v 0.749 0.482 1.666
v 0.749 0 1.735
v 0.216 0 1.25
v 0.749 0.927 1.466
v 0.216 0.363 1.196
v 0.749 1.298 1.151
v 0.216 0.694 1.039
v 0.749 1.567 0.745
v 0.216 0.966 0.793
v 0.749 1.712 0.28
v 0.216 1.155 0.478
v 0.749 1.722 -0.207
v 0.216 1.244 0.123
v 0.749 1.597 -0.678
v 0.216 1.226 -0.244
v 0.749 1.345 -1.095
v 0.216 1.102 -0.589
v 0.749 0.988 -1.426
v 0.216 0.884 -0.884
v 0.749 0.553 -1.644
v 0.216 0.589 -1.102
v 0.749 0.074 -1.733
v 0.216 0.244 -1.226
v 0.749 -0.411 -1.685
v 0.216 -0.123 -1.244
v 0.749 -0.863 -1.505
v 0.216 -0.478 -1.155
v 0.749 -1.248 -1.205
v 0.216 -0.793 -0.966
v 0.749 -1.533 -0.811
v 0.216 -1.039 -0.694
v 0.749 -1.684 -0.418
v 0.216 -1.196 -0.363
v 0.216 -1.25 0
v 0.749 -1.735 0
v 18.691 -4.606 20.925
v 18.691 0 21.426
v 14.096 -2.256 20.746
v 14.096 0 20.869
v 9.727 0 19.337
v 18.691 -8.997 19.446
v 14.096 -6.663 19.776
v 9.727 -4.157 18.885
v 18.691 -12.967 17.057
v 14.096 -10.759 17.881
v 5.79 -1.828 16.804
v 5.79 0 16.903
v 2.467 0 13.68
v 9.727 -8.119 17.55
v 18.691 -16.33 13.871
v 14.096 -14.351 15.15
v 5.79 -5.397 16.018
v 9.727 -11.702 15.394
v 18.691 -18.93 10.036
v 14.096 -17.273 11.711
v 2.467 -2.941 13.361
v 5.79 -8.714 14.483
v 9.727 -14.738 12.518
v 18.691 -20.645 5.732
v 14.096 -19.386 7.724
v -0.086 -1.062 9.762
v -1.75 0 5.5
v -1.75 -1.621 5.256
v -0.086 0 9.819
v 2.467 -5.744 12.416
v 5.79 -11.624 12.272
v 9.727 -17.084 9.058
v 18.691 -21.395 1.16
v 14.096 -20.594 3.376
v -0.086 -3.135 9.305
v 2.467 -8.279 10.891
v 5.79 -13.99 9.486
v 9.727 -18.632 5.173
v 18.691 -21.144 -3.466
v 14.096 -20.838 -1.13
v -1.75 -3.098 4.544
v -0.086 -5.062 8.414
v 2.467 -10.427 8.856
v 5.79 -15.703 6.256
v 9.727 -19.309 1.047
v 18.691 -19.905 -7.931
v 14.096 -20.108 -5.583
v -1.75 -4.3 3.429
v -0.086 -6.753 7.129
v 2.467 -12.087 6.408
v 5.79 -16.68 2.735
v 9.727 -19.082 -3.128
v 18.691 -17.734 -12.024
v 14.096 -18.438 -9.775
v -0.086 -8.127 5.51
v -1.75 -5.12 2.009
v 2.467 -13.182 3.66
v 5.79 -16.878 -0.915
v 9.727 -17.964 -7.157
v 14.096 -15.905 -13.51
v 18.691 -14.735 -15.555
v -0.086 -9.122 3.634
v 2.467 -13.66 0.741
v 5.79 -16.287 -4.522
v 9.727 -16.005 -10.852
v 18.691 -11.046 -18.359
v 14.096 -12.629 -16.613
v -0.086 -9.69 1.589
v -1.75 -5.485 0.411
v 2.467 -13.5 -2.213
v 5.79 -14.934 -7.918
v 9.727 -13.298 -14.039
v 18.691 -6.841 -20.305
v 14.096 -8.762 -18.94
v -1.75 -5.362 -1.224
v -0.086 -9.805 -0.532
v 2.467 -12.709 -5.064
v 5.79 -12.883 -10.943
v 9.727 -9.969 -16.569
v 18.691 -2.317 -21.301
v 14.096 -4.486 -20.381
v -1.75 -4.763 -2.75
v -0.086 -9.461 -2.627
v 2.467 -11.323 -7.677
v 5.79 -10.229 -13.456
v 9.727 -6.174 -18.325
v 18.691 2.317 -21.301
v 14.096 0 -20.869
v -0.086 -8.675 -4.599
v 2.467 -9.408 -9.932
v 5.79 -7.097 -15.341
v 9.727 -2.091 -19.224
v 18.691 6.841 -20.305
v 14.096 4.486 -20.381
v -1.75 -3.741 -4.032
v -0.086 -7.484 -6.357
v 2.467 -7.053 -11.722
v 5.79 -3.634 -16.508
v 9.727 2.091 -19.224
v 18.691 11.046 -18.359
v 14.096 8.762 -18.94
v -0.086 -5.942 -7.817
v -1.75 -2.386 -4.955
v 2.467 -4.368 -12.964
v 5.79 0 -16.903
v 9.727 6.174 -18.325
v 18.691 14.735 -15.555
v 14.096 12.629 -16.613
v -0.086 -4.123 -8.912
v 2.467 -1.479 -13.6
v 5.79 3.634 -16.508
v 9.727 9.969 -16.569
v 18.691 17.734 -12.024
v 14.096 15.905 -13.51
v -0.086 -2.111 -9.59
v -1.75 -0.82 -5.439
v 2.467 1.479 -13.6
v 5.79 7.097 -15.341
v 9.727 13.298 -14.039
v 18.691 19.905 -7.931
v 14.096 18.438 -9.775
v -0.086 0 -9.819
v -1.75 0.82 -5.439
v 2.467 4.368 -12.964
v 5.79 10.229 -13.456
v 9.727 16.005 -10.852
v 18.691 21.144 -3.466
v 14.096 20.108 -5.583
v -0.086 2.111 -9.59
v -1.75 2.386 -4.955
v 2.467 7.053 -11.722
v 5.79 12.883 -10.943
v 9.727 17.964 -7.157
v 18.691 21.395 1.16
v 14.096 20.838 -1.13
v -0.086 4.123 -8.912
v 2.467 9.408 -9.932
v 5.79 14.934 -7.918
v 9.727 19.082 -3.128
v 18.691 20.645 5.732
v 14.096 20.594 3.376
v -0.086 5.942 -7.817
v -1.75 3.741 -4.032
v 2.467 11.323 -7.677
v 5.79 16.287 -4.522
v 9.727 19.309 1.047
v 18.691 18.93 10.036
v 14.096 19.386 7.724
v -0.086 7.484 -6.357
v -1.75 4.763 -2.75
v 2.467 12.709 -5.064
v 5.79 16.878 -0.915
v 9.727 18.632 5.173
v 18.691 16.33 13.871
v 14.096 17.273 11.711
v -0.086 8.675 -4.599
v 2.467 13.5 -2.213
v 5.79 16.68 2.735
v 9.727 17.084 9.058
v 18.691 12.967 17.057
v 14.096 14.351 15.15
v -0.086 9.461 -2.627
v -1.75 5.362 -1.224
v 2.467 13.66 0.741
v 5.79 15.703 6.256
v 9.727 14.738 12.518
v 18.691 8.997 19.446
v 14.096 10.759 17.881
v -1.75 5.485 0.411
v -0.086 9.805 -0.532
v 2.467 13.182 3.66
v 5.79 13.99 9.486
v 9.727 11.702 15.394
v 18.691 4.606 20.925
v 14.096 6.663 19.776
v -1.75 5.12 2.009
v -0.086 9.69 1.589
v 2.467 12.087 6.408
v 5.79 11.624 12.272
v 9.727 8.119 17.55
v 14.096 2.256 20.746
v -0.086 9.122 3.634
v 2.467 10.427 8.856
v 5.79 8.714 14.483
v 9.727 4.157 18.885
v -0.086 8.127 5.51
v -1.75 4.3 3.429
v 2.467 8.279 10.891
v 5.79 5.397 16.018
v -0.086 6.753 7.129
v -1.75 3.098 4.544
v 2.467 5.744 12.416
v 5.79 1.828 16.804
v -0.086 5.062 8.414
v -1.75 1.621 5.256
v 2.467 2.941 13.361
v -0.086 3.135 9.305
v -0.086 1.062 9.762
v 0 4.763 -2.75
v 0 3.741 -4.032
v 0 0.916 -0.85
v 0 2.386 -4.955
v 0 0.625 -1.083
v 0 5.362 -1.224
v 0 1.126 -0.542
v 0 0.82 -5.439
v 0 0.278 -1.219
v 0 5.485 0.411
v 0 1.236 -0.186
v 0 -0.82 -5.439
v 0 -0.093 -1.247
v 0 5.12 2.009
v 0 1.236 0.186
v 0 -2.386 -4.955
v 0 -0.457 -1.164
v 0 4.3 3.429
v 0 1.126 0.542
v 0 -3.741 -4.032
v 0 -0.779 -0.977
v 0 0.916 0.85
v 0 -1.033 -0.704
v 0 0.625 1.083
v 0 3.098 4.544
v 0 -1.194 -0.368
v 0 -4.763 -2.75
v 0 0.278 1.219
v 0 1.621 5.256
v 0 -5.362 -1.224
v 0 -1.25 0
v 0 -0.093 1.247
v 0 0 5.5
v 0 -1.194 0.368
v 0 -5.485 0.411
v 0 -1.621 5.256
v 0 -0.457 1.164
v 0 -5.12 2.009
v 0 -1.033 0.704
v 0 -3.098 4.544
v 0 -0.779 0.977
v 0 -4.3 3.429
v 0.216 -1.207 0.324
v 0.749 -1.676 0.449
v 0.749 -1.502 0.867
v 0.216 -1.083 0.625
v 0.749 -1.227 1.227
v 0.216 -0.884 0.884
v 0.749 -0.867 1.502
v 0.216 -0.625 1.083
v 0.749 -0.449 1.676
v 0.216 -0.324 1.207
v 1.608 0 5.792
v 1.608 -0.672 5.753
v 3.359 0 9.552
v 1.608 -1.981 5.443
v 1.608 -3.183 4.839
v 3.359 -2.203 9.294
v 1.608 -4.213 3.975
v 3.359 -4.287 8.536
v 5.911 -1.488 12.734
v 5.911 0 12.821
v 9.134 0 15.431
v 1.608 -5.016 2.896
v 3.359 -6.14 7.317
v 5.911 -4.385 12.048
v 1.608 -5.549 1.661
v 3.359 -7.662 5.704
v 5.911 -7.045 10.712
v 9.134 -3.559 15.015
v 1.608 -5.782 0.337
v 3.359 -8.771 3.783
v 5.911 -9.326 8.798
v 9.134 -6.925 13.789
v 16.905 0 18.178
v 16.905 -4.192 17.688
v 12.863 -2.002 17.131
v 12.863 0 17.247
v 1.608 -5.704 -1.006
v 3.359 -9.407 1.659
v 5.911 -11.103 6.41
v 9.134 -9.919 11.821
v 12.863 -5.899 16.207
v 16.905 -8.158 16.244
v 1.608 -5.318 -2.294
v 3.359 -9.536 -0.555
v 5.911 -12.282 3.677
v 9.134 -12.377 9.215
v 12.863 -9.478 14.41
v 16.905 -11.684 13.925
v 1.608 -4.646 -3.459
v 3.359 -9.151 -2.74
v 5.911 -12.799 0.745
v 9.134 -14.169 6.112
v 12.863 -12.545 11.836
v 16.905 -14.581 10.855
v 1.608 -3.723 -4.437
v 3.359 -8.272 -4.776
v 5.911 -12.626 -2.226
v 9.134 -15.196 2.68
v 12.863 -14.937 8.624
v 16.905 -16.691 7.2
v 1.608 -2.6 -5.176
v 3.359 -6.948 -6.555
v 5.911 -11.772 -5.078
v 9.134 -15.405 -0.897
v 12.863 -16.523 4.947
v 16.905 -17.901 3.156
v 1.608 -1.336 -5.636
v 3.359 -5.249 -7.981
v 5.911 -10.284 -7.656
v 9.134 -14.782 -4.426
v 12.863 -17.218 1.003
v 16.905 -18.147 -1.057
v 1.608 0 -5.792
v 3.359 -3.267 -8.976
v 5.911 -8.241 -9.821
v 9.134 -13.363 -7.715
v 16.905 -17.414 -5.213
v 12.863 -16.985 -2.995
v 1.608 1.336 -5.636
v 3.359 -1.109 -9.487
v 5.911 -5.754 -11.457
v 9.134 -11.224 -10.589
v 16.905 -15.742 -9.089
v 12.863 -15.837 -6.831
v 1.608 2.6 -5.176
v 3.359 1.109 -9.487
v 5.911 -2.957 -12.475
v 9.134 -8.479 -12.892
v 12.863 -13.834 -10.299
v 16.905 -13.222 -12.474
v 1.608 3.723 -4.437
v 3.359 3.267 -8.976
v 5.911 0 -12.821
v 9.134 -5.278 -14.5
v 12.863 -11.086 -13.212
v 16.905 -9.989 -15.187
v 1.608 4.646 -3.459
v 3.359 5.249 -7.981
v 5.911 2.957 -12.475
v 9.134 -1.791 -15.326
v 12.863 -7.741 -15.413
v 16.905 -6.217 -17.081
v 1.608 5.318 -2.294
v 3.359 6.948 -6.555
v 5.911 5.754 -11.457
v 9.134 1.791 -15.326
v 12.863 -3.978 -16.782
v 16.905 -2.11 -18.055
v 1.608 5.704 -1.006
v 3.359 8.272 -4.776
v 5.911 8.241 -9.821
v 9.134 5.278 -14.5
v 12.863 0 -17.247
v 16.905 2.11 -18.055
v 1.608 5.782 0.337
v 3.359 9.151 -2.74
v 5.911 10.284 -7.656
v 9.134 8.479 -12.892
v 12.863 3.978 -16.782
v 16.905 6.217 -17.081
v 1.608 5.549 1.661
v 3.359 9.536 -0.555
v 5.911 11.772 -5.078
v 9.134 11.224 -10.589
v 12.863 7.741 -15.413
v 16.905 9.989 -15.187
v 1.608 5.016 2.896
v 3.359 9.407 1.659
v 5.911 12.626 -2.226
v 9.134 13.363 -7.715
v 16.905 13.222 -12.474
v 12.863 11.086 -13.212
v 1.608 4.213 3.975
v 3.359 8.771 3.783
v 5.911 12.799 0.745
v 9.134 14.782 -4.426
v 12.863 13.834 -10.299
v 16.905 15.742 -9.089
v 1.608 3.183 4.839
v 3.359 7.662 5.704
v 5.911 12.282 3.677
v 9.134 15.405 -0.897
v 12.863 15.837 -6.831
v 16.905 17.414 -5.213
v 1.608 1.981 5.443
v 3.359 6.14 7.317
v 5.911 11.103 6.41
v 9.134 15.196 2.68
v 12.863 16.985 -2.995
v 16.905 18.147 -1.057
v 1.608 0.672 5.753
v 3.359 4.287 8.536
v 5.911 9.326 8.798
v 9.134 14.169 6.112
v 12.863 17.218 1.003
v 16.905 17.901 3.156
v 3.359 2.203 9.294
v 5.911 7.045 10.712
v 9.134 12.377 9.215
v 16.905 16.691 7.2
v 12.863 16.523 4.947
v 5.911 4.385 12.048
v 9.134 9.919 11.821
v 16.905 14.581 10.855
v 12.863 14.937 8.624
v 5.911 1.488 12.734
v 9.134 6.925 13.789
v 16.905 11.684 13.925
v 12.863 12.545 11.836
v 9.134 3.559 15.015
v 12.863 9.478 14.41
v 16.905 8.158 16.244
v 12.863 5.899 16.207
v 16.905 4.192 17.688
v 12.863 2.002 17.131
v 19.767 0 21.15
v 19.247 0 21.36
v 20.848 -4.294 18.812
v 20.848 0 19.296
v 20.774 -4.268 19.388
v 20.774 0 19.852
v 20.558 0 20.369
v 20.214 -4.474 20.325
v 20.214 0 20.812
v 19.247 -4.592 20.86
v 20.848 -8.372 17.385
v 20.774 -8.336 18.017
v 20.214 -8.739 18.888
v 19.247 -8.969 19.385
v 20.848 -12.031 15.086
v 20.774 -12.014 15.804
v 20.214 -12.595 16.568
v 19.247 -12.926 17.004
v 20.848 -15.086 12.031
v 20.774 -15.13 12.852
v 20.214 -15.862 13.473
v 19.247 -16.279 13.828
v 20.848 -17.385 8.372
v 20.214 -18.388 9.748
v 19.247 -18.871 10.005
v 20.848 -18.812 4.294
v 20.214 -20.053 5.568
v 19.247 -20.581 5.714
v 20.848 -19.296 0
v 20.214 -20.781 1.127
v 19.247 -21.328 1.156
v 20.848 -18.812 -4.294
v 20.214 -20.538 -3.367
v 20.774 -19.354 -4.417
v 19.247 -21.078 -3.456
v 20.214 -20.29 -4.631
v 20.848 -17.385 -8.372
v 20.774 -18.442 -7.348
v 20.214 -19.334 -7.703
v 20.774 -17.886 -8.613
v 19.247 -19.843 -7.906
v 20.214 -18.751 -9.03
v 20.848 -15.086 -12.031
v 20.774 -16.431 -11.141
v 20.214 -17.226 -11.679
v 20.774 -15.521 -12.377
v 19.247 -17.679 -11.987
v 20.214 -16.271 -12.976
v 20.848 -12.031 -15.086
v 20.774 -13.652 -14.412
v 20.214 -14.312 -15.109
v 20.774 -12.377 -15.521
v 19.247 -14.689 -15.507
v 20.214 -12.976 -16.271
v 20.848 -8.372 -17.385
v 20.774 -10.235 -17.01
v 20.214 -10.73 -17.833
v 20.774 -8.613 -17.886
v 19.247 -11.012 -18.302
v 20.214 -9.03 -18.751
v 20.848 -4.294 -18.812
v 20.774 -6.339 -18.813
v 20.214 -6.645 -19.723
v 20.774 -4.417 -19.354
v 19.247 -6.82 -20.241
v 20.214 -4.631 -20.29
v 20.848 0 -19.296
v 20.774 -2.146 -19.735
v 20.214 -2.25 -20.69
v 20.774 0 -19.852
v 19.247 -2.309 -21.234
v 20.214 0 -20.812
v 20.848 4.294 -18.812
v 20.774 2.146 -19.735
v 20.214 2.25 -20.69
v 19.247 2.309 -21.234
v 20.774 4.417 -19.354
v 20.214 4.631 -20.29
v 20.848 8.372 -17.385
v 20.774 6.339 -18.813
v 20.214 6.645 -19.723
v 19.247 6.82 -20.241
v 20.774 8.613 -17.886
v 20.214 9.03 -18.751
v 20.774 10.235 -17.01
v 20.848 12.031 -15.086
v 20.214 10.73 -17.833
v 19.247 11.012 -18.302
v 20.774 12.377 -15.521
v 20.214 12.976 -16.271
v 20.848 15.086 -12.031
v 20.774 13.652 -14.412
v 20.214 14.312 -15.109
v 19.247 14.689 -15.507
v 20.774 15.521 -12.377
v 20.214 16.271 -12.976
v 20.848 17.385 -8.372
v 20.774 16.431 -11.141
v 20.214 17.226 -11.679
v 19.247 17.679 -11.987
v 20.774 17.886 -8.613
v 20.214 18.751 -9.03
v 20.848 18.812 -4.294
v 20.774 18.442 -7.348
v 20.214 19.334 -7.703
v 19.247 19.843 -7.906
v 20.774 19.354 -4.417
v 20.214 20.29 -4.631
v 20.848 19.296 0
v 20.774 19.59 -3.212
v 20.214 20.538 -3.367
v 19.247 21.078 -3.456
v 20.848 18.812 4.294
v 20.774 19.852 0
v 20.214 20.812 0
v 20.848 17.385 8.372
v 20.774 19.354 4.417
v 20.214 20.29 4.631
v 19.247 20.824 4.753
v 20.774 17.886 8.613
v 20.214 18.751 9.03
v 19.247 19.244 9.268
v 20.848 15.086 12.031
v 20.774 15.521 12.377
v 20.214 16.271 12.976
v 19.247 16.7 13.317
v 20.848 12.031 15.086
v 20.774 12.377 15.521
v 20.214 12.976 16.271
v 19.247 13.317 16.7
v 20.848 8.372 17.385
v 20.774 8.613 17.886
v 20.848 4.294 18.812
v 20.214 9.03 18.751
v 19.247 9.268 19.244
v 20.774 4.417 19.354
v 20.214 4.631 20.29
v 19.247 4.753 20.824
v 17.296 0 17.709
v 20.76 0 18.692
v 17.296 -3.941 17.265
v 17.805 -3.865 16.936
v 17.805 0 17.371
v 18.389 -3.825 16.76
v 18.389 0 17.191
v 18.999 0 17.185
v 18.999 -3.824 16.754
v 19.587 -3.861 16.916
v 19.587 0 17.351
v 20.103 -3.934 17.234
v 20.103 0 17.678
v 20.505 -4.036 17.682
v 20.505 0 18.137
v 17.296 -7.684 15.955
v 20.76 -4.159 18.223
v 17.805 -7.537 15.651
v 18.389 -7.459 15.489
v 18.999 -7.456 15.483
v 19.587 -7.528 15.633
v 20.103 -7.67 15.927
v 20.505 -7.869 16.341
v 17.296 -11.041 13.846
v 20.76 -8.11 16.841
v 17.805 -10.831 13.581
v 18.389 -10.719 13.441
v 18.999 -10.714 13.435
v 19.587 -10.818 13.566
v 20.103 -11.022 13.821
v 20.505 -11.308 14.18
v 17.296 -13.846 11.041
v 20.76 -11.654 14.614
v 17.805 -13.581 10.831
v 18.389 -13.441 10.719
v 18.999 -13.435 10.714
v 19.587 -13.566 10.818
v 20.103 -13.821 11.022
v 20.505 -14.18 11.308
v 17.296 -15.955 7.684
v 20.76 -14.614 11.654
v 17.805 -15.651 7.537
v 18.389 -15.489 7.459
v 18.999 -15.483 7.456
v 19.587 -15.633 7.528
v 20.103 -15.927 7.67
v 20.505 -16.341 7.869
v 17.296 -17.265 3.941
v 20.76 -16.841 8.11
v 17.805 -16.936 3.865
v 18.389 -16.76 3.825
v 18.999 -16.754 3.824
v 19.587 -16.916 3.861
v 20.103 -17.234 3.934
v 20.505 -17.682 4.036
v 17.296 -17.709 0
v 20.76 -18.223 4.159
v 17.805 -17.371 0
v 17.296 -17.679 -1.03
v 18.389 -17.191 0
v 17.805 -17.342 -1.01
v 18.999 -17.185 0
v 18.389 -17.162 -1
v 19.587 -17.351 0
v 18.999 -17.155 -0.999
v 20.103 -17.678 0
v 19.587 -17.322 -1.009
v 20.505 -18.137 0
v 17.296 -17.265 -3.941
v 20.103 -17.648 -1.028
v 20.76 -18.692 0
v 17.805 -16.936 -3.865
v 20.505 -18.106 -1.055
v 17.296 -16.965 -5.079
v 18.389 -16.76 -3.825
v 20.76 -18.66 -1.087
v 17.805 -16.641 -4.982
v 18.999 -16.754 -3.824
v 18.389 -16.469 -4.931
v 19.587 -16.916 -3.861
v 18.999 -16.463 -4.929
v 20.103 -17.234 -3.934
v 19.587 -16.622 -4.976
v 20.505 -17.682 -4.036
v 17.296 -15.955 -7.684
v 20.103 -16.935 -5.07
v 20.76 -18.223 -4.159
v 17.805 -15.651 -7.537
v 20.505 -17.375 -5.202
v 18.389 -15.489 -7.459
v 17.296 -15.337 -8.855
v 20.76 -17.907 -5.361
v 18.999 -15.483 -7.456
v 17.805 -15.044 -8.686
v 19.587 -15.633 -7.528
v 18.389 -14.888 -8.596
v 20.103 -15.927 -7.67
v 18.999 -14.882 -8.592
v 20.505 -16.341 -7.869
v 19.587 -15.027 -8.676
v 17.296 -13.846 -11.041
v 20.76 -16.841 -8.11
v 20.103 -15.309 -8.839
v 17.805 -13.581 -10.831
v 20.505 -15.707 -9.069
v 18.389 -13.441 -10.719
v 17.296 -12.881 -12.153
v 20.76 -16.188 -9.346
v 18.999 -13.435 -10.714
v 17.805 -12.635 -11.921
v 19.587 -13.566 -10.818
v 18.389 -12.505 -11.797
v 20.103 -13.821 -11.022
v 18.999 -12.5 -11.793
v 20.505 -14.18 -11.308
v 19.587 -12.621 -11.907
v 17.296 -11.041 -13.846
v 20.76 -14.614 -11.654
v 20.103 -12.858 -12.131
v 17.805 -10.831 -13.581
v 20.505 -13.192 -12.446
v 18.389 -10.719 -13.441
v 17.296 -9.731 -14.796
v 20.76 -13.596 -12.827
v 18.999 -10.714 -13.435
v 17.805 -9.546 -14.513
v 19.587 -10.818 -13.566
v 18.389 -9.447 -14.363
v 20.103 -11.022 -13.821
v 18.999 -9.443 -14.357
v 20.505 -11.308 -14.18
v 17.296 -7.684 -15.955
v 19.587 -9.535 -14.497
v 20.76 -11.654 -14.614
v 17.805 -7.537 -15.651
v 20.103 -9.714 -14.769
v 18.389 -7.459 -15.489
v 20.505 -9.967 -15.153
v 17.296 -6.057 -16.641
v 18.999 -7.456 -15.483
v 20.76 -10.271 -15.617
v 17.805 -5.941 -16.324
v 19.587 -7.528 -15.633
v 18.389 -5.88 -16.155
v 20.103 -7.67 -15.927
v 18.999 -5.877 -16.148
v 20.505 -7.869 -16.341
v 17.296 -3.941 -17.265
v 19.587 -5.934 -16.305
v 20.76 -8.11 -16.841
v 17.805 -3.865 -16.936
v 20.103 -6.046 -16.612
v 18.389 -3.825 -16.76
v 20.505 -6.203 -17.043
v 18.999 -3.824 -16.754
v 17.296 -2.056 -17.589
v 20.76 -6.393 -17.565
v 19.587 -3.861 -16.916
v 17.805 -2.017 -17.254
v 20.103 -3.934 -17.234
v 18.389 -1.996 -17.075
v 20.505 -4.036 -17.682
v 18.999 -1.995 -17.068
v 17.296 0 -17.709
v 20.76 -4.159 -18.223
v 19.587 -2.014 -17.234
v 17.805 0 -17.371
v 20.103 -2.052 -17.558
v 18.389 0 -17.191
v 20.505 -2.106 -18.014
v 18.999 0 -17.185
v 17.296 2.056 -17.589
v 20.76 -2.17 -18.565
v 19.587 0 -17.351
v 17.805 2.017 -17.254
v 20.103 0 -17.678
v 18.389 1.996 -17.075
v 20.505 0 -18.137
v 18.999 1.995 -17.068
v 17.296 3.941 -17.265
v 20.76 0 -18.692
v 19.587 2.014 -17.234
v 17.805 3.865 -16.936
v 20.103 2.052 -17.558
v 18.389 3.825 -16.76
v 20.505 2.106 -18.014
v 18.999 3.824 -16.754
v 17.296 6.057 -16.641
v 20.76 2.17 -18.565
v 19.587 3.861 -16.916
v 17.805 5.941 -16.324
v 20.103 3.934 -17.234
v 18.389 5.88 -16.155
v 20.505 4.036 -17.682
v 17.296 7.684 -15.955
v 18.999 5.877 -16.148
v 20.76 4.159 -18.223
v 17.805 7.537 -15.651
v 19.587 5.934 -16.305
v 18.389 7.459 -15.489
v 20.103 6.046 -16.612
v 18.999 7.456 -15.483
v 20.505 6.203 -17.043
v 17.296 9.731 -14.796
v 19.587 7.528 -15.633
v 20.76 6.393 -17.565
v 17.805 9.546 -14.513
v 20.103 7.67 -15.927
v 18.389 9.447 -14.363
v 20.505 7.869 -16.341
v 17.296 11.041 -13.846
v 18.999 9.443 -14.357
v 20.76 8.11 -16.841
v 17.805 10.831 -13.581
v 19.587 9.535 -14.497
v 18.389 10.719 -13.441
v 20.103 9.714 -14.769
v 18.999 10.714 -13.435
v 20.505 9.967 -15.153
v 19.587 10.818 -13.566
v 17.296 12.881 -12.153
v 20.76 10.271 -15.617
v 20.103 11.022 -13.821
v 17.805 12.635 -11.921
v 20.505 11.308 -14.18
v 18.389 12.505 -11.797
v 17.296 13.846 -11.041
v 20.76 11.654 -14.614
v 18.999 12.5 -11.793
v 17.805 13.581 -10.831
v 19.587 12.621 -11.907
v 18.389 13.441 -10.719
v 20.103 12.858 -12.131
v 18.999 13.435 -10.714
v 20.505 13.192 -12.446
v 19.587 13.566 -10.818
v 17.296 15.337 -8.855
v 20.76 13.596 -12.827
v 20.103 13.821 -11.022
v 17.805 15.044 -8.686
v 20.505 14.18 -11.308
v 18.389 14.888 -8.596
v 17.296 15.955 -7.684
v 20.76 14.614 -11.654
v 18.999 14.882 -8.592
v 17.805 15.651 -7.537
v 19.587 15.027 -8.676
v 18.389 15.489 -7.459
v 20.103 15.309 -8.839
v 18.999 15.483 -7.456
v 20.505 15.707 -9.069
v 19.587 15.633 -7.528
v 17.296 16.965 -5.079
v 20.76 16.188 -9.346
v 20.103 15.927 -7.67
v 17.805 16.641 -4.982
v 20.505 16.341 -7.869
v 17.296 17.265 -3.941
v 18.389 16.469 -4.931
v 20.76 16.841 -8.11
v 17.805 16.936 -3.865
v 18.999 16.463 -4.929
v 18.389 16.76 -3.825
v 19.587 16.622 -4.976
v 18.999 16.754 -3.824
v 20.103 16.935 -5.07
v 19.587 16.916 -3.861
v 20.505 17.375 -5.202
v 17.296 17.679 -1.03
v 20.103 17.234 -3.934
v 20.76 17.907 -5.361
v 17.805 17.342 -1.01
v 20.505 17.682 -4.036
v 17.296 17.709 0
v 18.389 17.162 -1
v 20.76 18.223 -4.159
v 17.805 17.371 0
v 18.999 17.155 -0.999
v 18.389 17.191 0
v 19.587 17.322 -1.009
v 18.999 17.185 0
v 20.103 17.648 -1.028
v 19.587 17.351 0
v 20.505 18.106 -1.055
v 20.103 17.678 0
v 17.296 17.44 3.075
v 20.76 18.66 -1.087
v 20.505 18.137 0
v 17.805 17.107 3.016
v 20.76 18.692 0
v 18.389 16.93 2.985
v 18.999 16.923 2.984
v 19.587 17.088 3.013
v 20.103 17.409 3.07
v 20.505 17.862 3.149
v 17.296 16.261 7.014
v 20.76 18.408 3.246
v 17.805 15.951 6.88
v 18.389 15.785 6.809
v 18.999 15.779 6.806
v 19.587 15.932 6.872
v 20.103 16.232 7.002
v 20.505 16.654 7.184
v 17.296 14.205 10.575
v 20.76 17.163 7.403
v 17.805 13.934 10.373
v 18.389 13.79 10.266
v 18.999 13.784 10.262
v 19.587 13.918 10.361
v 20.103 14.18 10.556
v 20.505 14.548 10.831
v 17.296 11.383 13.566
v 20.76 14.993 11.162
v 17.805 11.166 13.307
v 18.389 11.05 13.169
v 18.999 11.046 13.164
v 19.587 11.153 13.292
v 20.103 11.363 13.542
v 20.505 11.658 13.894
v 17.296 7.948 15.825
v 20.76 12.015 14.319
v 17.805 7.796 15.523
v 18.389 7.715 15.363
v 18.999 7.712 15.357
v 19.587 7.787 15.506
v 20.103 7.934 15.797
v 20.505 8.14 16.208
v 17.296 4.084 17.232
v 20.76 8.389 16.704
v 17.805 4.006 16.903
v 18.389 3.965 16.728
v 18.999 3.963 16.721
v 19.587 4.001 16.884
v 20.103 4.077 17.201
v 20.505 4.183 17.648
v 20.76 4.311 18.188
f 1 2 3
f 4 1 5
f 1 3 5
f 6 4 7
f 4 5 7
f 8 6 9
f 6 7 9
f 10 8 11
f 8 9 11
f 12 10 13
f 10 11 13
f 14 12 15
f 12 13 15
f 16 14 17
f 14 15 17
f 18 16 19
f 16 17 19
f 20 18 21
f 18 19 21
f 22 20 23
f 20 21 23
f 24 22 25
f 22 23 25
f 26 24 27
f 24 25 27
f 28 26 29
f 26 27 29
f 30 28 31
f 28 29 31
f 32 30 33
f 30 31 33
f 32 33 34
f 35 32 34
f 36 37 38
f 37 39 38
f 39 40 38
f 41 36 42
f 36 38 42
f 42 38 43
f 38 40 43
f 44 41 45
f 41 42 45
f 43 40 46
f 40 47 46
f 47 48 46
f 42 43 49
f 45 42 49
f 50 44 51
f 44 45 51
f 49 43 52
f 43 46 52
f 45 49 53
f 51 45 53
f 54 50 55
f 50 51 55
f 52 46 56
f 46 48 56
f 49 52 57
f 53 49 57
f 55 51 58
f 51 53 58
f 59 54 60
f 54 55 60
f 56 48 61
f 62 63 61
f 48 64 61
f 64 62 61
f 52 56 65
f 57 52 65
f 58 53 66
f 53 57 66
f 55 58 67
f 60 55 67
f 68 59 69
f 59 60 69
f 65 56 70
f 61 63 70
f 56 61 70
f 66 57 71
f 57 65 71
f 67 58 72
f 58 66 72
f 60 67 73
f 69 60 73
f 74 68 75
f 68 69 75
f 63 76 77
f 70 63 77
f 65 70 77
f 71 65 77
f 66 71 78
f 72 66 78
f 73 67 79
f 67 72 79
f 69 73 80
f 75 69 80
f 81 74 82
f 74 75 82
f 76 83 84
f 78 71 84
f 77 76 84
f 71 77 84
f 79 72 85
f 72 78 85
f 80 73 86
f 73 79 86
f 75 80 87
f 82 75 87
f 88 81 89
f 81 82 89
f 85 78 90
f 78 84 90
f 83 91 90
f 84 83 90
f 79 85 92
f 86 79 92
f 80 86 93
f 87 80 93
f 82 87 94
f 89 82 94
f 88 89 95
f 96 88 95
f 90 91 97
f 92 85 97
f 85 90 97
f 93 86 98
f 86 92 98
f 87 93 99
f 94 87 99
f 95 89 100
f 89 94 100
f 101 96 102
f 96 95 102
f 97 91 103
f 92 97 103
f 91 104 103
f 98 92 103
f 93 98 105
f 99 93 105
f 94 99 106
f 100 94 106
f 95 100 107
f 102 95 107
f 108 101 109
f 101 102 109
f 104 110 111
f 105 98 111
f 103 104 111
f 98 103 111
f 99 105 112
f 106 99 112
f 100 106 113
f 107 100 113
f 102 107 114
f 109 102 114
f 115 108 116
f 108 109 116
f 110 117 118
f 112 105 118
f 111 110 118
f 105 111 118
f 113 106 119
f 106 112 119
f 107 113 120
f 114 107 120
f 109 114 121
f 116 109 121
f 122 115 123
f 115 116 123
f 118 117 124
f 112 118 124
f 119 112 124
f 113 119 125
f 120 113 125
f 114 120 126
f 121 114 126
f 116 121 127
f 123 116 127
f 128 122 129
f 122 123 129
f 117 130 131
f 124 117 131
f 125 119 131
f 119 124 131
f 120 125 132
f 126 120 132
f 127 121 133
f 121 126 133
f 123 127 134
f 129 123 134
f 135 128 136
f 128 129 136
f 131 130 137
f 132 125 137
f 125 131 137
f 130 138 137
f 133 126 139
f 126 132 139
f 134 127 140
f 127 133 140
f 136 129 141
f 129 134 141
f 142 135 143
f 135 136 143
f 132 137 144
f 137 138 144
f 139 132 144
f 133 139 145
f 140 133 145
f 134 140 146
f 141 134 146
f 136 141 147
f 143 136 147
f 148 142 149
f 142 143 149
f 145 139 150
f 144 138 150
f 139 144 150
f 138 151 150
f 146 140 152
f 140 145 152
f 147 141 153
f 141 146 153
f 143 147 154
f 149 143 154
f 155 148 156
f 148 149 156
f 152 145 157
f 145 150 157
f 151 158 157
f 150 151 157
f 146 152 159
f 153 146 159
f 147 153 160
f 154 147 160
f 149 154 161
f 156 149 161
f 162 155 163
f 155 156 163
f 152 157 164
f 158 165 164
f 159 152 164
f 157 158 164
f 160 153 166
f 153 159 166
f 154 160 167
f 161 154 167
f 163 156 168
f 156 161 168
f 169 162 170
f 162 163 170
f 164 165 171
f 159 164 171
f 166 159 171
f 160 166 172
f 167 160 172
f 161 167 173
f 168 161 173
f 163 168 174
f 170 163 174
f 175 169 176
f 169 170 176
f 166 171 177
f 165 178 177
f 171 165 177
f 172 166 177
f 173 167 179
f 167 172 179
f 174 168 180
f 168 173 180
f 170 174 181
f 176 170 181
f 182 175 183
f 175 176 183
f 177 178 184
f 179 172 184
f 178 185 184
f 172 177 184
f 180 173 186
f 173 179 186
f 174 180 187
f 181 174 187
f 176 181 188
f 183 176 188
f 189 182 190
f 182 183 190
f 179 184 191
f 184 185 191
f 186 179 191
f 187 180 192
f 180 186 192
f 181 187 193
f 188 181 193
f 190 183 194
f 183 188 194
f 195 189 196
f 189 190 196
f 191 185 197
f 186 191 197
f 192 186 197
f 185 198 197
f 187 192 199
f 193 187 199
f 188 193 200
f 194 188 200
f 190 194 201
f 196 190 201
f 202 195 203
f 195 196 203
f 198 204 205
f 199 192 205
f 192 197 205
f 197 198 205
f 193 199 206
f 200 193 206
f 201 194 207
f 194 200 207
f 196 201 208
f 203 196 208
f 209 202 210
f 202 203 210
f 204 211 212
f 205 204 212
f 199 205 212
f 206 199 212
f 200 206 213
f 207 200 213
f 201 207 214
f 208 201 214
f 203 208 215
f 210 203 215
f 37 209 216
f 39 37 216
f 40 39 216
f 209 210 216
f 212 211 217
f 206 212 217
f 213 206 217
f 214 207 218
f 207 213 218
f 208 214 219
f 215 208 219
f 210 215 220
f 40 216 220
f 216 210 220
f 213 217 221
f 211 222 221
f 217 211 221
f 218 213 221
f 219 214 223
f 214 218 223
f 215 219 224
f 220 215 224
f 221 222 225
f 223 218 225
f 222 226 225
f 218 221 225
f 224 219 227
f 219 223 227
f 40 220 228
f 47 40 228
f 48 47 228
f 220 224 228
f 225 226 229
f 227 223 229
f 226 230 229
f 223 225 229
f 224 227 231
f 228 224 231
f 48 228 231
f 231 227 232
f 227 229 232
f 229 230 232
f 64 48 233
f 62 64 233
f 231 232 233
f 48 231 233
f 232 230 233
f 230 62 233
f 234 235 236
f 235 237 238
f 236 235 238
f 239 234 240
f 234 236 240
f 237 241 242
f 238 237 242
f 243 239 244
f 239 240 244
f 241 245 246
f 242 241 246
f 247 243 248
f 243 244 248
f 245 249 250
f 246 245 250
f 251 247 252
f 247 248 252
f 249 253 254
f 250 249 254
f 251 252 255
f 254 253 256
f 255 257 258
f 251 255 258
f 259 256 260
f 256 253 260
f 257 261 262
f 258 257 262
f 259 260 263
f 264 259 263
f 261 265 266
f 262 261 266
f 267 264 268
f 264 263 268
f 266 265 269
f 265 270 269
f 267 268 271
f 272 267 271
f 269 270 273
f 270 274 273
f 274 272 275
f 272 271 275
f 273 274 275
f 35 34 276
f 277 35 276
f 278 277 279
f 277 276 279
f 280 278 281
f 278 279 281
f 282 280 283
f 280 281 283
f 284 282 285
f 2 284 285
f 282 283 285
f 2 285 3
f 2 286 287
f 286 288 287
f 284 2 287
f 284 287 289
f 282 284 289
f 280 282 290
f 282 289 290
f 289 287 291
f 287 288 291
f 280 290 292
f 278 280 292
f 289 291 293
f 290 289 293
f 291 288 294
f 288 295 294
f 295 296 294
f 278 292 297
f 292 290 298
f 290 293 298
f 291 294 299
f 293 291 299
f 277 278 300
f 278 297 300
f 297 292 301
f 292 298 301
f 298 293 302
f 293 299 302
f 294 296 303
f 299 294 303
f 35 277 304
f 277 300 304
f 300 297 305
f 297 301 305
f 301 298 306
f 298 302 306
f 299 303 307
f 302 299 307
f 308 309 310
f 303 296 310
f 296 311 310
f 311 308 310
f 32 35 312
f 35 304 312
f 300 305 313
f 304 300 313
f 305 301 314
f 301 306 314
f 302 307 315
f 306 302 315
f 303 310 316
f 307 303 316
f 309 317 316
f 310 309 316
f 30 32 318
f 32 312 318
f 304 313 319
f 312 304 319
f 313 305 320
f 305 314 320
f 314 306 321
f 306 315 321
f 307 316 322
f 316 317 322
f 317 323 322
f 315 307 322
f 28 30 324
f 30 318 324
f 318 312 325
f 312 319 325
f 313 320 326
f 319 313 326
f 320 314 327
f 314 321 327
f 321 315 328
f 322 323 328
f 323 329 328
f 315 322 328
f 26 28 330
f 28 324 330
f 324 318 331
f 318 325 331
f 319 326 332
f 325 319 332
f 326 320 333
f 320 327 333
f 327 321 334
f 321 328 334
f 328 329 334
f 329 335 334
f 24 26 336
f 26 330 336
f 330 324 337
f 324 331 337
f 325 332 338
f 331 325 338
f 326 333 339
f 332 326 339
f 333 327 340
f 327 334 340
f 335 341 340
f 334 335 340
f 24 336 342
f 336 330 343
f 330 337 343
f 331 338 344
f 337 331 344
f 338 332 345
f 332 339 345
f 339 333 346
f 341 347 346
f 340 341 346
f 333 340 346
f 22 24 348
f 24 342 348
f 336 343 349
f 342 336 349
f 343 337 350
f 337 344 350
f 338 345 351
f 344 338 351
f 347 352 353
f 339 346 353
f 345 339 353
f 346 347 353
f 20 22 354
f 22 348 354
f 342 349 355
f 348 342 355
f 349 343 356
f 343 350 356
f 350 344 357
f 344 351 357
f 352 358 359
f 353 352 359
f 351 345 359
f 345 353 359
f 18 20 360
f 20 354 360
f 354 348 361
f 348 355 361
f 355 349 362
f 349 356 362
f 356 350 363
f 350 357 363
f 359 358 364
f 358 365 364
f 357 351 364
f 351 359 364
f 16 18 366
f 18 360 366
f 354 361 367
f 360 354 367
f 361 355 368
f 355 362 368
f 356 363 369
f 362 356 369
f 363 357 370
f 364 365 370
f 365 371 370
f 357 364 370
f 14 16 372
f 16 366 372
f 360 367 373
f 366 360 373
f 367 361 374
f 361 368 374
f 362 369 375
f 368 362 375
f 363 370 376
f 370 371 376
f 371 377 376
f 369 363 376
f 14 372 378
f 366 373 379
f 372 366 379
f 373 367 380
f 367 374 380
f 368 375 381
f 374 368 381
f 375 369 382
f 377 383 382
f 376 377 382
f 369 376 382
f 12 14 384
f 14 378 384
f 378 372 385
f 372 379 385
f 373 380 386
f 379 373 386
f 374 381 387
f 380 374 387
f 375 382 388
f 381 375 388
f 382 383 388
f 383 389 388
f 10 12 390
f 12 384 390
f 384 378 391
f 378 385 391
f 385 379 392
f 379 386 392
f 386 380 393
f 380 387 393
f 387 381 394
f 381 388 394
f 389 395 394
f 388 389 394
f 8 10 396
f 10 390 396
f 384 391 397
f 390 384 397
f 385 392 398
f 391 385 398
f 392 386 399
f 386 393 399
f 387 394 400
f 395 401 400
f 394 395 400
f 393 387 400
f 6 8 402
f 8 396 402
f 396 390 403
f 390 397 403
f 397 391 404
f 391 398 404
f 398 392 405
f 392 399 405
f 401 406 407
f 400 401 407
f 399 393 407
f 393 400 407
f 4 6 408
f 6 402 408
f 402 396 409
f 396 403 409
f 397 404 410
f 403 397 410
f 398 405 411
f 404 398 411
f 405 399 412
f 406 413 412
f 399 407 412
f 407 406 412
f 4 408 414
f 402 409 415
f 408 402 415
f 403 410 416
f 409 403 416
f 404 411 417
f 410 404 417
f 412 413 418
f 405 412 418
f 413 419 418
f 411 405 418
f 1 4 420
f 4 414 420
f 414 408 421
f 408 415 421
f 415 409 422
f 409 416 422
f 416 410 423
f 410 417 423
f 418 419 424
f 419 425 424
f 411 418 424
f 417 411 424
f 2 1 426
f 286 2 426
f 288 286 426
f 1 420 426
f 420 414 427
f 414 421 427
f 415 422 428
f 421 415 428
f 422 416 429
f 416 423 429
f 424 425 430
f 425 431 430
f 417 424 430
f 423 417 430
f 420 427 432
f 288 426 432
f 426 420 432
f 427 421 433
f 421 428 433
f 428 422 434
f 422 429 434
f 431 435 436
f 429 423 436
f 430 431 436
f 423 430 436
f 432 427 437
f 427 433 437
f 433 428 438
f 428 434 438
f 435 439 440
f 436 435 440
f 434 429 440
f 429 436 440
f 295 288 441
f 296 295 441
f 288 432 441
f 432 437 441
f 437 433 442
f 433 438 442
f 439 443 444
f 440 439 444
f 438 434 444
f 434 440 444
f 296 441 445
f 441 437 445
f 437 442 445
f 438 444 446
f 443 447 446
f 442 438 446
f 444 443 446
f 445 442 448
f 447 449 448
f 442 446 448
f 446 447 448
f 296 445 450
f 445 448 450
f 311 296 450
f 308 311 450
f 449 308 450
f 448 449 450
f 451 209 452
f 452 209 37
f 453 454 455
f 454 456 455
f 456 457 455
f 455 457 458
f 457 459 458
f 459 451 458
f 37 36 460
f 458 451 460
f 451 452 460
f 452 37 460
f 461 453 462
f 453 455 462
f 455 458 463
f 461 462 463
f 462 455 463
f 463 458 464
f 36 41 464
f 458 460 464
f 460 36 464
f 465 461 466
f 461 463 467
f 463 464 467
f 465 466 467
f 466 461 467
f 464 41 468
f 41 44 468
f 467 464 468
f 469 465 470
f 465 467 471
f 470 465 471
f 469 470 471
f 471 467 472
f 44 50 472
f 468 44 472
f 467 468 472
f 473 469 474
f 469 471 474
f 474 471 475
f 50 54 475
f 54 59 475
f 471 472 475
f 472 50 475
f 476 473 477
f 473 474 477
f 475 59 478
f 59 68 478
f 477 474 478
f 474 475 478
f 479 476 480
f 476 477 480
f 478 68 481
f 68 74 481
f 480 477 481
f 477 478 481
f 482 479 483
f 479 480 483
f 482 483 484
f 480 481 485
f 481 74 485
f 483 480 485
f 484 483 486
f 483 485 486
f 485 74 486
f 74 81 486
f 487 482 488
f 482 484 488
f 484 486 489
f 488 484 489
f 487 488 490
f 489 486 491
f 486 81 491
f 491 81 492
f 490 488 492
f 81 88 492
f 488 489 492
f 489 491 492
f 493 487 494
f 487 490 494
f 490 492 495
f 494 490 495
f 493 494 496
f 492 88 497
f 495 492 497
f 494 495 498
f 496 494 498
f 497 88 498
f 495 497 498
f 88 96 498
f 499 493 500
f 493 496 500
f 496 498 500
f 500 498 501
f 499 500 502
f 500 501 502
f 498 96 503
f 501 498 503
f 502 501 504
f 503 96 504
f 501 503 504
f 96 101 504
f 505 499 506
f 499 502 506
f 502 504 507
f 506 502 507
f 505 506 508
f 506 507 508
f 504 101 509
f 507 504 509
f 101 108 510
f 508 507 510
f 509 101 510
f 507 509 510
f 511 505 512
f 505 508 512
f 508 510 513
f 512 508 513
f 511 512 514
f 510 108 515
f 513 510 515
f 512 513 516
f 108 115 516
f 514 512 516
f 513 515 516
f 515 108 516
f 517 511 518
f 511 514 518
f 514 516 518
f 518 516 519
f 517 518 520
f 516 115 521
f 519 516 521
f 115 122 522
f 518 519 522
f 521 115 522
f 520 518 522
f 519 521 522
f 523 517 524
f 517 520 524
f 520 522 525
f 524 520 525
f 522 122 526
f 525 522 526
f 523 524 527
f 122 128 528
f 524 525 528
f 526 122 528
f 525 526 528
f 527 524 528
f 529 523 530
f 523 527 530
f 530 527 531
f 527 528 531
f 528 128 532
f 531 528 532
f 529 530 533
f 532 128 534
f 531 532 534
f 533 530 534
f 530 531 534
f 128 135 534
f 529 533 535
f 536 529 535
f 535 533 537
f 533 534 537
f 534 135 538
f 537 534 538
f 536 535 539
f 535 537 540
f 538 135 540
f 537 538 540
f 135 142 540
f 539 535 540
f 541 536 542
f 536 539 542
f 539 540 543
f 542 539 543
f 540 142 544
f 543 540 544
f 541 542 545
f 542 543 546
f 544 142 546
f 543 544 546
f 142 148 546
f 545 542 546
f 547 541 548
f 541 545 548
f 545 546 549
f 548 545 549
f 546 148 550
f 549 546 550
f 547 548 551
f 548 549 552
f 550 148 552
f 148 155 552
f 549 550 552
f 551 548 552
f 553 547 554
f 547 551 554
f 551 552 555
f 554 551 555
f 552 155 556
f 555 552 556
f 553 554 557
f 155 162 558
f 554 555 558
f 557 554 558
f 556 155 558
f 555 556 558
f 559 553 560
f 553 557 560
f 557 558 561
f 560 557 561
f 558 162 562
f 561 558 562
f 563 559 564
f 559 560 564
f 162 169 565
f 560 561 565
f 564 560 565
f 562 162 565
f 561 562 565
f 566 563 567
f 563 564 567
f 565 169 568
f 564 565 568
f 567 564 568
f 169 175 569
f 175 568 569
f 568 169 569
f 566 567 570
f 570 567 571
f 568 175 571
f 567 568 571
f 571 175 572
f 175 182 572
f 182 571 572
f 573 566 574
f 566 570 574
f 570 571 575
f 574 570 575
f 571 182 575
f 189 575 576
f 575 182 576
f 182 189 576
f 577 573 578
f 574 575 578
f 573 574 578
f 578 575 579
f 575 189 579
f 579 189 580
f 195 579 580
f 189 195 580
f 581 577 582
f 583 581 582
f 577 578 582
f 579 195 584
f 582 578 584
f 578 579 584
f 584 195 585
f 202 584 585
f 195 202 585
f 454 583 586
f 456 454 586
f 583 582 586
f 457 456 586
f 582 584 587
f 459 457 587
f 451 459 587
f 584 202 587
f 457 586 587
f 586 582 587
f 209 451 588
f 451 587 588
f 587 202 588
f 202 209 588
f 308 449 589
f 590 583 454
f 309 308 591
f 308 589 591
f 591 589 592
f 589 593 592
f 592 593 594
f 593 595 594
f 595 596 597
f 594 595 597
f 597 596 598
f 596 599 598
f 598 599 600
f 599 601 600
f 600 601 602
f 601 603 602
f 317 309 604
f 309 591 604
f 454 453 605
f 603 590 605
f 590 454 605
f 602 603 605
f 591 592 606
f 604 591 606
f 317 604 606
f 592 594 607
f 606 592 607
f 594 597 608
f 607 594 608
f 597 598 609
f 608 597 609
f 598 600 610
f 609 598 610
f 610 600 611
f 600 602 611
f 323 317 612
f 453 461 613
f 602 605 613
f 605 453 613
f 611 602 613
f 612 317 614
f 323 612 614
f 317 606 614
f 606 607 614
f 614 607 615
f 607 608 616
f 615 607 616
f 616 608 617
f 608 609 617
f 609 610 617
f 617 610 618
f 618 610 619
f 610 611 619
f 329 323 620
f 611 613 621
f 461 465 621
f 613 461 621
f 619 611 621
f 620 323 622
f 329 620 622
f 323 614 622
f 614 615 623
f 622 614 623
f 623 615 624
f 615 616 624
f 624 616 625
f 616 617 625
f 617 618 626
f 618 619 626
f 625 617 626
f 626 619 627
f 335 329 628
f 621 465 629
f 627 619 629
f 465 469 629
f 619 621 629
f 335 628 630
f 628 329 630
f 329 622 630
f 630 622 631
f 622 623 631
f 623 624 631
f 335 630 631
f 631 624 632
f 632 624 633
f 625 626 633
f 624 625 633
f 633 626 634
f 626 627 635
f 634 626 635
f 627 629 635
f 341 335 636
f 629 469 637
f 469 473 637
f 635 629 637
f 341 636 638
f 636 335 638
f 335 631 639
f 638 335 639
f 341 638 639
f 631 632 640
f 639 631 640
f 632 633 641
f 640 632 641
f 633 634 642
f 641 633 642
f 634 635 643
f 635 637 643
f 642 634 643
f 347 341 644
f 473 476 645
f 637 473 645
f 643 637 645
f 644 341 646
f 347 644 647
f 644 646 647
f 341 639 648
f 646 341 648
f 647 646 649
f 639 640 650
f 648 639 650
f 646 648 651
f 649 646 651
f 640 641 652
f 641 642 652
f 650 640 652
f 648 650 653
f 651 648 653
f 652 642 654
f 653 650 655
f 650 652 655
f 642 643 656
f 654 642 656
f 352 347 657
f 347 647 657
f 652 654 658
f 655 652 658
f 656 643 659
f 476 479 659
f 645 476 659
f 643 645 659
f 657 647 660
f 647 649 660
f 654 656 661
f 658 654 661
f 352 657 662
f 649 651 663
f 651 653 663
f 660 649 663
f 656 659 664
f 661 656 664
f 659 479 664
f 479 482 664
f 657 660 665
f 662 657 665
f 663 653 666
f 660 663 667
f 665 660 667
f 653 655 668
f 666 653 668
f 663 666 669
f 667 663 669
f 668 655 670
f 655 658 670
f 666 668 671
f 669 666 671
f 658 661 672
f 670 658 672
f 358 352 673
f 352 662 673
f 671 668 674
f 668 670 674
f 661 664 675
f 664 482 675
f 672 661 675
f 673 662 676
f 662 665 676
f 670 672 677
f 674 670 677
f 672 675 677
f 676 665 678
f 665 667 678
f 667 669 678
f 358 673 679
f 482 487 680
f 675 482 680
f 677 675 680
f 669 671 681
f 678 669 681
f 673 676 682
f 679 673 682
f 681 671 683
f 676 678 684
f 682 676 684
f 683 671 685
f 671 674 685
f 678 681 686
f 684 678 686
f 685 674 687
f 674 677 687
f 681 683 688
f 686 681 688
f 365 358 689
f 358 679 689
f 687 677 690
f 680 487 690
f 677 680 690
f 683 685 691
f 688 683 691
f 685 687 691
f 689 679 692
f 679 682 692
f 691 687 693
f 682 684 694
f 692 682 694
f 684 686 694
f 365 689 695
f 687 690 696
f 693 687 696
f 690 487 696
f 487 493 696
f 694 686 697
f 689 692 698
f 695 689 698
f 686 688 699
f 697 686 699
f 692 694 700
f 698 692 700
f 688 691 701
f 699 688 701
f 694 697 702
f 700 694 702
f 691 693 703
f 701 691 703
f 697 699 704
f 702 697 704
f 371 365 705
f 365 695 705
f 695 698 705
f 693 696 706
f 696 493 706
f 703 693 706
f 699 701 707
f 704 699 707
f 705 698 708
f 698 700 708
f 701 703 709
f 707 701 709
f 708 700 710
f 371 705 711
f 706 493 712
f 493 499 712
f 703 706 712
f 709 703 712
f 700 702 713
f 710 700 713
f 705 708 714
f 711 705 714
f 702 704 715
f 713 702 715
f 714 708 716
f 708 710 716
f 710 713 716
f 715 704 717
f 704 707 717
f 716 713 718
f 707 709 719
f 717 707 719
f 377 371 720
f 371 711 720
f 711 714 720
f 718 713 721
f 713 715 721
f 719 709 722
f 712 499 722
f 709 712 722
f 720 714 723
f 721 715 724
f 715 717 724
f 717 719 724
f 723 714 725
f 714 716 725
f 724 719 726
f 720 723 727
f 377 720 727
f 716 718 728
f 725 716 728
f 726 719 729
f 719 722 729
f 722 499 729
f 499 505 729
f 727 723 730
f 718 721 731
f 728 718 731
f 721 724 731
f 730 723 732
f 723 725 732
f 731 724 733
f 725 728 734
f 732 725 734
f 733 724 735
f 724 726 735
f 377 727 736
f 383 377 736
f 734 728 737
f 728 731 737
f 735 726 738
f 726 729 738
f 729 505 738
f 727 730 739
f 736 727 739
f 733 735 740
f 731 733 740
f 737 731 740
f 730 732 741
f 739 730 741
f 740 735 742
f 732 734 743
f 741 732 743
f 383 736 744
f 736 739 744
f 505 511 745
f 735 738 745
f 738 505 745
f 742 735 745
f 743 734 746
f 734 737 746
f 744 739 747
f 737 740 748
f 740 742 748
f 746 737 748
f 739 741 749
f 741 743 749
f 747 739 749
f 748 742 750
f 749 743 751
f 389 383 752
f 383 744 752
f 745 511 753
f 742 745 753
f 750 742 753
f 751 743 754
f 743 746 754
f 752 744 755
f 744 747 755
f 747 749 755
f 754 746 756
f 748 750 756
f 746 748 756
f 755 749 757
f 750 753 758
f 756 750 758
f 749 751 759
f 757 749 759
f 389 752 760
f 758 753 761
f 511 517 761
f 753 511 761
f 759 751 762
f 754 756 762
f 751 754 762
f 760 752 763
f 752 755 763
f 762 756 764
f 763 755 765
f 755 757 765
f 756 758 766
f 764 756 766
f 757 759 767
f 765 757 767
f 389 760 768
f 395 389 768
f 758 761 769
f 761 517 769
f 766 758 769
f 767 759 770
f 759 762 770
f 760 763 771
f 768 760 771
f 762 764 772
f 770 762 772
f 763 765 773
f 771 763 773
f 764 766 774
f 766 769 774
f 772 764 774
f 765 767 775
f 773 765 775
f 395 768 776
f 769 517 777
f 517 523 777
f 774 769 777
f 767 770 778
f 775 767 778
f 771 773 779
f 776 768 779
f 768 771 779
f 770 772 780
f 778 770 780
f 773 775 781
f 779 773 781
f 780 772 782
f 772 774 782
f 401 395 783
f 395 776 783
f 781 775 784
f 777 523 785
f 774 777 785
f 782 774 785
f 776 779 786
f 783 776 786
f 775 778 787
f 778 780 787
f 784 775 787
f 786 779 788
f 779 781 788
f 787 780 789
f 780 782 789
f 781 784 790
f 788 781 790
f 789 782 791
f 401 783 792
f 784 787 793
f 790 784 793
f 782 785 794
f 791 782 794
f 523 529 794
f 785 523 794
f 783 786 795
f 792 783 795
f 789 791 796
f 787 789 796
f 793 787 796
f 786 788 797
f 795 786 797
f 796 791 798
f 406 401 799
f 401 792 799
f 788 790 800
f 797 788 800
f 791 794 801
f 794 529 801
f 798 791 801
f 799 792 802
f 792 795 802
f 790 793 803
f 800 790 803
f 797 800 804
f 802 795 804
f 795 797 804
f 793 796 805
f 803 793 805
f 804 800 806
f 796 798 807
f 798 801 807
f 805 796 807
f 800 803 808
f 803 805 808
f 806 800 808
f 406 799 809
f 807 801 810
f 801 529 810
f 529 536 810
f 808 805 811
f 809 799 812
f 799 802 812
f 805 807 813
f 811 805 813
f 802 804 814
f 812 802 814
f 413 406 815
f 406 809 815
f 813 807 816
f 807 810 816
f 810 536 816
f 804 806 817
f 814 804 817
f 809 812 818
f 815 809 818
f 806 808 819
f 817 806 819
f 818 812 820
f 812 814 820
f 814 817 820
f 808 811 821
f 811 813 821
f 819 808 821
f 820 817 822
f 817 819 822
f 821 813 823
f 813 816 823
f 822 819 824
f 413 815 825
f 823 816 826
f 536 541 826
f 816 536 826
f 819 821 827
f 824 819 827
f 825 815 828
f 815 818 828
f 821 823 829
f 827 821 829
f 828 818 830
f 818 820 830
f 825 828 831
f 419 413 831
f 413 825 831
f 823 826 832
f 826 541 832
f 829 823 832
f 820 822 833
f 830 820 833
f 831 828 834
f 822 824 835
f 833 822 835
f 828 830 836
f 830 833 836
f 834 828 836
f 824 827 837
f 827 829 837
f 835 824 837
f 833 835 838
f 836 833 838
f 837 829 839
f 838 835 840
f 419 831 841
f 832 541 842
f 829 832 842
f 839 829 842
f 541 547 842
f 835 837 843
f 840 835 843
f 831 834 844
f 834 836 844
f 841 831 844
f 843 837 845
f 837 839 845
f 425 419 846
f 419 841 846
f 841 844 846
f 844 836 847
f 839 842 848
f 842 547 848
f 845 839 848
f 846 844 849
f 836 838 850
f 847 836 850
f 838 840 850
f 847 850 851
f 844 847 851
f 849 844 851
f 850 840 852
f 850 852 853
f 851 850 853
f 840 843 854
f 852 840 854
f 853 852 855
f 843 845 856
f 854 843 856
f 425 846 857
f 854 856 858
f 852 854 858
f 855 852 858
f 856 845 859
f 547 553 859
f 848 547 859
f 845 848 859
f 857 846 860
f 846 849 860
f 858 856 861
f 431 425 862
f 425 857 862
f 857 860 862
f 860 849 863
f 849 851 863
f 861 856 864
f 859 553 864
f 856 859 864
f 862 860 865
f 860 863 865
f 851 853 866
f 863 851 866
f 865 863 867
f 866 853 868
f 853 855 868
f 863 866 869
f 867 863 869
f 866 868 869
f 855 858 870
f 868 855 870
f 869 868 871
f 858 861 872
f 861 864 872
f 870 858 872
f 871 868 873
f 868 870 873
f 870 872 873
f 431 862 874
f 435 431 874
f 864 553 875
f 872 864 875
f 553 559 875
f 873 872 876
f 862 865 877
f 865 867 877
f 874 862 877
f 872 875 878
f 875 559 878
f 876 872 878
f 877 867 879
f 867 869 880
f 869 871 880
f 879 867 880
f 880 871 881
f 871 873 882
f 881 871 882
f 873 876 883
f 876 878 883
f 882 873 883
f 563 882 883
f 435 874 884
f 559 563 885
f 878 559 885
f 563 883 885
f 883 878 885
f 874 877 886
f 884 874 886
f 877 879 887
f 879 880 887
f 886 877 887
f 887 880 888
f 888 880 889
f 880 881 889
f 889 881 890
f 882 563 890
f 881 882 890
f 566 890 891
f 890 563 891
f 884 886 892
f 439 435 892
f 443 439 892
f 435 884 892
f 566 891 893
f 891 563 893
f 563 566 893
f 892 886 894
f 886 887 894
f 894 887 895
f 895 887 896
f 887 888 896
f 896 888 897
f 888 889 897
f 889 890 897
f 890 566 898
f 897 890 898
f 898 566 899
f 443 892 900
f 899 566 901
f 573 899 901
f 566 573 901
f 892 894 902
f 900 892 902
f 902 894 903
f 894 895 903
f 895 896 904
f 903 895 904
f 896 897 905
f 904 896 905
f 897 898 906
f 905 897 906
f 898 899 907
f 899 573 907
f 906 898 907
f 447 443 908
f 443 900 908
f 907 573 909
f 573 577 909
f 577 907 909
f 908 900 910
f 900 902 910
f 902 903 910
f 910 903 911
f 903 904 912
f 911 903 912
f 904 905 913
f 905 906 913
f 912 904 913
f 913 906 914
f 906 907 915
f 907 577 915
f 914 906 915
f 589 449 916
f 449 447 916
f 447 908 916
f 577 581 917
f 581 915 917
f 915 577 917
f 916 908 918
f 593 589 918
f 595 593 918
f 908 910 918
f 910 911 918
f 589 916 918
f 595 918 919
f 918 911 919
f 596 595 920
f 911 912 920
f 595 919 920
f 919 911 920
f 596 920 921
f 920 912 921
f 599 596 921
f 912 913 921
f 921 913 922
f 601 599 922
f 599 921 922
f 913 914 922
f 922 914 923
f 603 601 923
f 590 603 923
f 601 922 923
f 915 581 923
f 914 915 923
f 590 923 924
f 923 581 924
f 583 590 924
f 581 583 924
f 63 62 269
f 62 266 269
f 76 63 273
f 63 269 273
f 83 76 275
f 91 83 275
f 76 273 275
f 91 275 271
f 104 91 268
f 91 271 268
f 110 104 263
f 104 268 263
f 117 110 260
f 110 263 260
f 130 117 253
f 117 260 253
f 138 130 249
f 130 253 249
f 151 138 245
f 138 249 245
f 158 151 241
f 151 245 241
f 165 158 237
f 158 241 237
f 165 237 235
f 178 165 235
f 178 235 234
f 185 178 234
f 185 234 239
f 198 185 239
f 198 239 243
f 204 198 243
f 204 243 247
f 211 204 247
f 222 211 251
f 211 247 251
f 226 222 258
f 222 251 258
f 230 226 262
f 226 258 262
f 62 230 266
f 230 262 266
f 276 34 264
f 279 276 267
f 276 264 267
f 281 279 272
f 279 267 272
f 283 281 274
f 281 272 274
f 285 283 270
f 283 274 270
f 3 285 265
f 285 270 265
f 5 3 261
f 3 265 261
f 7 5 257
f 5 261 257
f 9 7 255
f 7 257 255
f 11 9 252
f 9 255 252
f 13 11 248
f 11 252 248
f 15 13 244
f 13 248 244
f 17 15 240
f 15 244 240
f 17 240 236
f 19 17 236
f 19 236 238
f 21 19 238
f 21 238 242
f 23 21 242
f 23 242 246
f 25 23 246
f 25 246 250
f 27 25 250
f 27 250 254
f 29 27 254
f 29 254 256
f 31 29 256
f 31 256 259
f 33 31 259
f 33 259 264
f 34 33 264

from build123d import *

# Parameters (mm, degrees)
F2_R        = 1.25
F3_DEPTH    = 20.848816548
F4_T2_ANGLE = 269.9999999999
F4_T4_ANGLE = 90.0000002223


# Not quite as in the source:
# - a fillet or chamfer that OpenCascade refuses, or shapes differently, is made with other operations: its cross-section is extruded or revolved along the edge and cut away or added


with BuildPart() as f1:
    # F0 (on Front) → F1 (revolve)
    with BuildSketch(Plane.XZ):
        with BuildLine():
            ThreePointArc((20.847816448, 19.2961636657), (20.2143632876, 20.8119613812), (18.6907213238, 21.4263072013))
            ThreePointArc((18.6907213238, 21.4263072013), (16.8507396209, 20.3225249849), (16.9045229372, 18.1775365926))
            ThreePointArc((16.9045229372, 18.1775365926), (19.2988876007, 17.2467192141), (20.847816448, 19.2961636657))
        make_face()
        with BuildLine():
            Line((-1.75, 5.5), (0, 5.5))
            Line((0, 5.5), (0, 0))
            Line((0, 0), (0.6667277431, 0))
            ThreePointArc((0.6667277431, 0), (5.3173187467, 12.1869687509), (16.9045229372, 18.1775365926))
            ThreePointArc((16.9045229372, 18.1775365926), (16.8507396209, 20.3225249849), (18.6907213238, 21.4263072013))
            ThreePointArc((18.6907213238, 21.4263072013), (5.7901979365, 16.9030256739), (-1.75, 5.5))
        make_face()
    revolve(axis=Axis((0.3358235447, 0, 0), (1, 0, 0)))

    # F2 (on face) → F3 (cut, through all)
    with BuildSketch(Plane(origin=(0, 0, 0), x_dir=(0, -1, 0), z_dir=(-1, 0, 0))):
        Circle(F2_R)
    extrude(amount=-F3_DEPTH, mode=Mode.SUBTRACT)

    # F4: chamfer of 0.5 on 2 edges, made by hand

    # F4_s1 → F4_t2 (revolve, cut)
    with BuildSketch(Plane.XZ):
        with BuildLine():
            Line((0.7639536686, 1.7481015134), (0.2013545471, 1.2365450652))
            Line((0.2013545471, 1.2365450652), (0.2013545471, 1.2265450652))
            ThreePointArc((0.2013545471, 1.2265450652), (0.4554194631, 1.24), (0.7094843791, 1.24))
            Line((0.7094843791, 1.24), (0.7194610064, 1.2493166933))
            ThreePointArc((0.7194610064, 1.2493166933), (0.7382742313, 1.4989228259), (0.7739086095, 1.7471532769))
            Line((0.7739086095, 1.7471532769), (0.7639536686, 1.7481015134))
        make_face()
    revolve(axis=Axis((0.7094843791, 0, 0), (-1, 0, 0)), revolution_arc=F4_T2_ANGLE, mode=Mode.SUBTRACT)

    # F4_s3 → F4_t4 (revolve, cut)
    with BuildSketch(Plane.XY.offset(2.5e-09)):
        with BuildLine():
            Line((0.7639536686, -1.7481015124), (0.2013545471, -1.2365450642))
            Line((0.2013545471, -1.2365450642), (0.2013545471, -1.2265450642))
            ThreePointArc((0.2013545471, -1.2265450642), (0.4554194631, -1.239999999), (0.7094843791, -1.24))
            Line((0.7094843791, -1.24), (0.7194610064, -1.2493166933))
            ThreePointArc((0.7194610064, -1.2493166933), (0.7382742313, -1.4989228254), (0.7739086095, -1.7471532759))
            Line((0.7739086095, -1.7471532759), (0.7639536686, -1.7481015124))
        make_face()
    revolve(axis=Axis((0.7094843791, -2.4e-09, 2.5e-09), (-1, 0, 0)), revolution_arc=F4_T4_ANGLE, mode=Mode.SUBTRACT)


solid = f1.part
